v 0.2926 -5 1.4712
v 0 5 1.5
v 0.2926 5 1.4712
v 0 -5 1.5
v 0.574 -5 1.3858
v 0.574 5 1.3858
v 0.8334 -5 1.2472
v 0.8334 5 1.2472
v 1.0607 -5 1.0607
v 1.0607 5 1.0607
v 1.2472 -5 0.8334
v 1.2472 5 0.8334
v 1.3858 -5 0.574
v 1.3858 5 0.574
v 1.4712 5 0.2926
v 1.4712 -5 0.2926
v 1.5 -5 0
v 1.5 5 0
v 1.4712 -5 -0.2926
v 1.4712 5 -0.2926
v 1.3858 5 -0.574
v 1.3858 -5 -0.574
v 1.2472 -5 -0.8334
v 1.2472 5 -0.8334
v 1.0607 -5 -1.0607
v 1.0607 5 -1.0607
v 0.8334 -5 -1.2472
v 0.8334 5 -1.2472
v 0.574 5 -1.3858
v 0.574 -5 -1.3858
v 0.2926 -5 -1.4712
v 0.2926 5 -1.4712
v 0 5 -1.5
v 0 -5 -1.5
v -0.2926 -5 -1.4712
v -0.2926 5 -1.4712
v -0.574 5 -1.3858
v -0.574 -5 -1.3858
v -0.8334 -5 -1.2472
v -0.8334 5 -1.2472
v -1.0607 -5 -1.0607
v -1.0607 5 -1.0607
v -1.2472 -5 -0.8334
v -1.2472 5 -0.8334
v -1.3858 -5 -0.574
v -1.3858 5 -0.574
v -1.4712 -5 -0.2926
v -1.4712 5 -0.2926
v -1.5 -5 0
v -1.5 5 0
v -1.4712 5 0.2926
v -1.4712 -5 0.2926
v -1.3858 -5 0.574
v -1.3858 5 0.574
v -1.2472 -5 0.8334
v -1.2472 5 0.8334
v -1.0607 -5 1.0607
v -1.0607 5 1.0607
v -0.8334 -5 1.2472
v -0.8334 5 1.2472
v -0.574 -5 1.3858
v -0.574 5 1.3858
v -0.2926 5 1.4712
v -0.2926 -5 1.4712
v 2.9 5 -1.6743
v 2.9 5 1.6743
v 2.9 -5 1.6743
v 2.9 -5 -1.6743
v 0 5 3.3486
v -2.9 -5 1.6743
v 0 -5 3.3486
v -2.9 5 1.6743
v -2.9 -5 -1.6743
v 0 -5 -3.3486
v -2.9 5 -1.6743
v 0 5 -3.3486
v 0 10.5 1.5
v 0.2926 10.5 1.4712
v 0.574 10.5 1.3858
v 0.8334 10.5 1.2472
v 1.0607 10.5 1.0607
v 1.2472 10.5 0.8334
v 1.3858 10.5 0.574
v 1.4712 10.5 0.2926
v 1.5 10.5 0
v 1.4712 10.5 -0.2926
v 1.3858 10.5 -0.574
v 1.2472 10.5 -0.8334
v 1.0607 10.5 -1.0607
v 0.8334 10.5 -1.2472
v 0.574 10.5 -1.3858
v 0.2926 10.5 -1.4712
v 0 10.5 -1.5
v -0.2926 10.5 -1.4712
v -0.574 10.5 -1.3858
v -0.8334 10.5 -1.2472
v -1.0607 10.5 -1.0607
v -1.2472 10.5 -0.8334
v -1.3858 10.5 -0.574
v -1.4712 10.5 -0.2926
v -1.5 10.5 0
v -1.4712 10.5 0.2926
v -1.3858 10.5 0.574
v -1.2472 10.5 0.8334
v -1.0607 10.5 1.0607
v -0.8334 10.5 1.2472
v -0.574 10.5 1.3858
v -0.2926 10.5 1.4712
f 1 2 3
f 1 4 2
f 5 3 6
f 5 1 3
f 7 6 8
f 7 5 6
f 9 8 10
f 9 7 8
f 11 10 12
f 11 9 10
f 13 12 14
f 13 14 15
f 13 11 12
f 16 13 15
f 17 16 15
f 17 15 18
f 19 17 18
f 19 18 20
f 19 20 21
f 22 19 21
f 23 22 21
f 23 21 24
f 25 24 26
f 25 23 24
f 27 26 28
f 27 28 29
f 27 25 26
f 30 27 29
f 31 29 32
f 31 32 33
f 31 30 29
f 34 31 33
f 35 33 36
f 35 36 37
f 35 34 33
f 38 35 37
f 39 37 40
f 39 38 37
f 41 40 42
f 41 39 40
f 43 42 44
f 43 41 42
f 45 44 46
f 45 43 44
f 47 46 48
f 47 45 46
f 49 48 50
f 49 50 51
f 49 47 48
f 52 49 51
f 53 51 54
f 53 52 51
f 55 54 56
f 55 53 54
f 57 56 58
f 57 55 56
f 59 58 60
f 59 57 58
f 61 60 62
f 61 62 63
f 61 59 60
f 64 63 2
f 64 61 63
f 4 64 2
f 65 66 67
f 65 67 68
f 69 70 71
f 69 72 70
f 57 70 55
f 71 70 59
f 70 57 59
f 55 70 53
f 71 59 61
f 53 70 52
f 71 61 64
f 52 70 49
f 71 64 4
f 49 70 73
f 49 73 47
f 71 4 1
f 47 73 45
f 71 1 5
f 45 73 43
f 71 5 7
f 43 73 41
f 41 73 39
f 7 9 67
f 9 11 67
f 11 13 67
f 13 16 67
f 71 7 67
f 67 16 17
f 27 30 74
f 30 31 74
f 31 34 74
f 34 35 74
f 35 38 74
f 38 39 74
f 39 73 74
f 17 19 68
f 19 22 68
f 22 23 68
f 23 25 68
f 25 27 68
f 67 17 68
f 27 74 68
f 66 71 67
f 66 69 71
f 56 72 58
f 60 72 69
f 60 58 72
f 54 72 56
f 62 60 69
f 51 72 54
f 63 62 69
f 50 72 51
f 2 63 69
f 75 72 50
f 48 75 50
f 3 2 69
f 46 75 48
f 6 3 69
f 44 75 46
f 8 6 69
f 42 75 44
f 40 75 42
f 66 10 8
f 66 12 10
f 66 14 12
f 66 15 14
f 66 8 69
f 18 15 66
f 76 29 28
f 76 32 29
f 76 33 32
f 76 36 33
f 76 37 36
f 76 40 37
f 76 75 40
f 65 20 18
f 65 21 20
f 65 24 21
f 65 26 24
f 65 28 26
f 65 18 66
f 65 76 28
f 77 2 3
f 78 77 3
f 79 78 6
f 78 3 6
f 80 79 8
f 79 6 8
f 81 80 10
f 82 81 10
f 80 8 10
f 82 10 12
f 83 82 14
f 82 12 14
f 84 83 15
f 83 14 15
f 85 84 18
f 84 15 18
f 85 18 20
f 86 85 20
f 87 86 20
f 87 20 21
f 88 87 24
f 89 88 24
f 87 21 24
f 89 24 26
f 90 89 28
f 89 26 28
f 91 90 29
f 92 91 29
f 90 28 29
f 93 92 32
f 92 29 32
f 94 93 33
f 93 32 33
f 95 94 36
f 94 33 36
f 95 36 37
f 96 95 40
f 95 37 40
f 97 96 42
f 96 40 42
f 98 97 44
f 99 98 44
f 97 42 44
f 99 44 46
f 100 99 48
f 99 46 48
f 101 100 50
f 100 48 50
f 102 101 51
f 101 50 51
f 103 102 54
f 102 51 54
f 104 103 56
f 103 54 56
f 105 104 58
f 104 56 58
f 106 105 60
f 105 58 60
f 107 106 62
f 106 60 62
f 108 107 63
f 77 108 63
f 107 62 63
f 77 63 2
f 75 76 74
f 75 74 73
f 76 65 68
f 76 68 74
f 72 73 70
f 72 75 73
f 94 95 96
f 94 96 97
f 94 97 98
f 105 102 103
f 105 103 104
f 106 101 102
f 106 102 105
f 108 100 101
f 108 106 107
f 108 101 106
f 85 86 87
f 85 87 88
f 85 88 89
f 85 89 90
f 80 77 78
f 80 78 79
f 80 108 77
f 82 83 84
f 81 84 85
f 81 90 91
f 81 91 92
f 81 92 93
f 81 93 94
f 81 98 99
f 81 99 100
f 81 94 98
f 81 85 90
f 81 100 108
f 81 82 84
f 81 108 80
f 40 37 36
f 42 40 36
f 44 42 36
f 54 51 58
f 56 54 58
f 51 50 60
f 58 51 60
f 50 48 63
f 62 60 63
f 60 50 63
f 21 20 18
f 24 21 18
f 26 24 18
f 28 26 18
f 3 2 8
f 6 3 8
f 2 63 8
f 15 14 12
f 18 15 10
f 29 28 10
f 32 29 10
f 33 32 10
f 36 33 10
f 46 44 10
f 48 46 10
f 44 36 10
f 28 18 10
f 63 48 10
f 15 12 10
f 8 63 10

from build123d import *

# Parameters (mm, degrees)
SKETCH1_R           = 1.5
BOSS_EXTRUDE1_DEPTH = 5
SKETCH2_R           = 1.5
BOSS_EXTRUDE2_DEPTH = 5.5


with BuildPart() as part:
    # Sketch1 → Boss-Extrude1 (new, symmetric)
    with BuildSketch(Plane(origin=(0, 0, 0), x_dir=(1, 0, 0), z_dir=(0, 1, 0))):
        Polygon((0, -3.348631561), (2.9, -1.674315781), (2.9, 1.674315781), (0, 3.348631561), (-2.9, 1.674315781), (-2.9, -1.674315781), align=None)
        with Locations(Location((0, 0, 0), (0, 0, 270))):
            Circle(SKETCH1_R, mode=Mode.SUBTRACT)
    extrude(amount=BOSS_EXTRUDE1_DEPTH, both=True)


with BuildPart() as body_2:
    # Sketch2 → Boss-Extrude2 (new body)
    with BuildSketch(Plane(origin=(0, 5, 0), x_dir=(1, 0, 0), z_dir=(0, 1, 0))):
        with Locations(Location((0, 0, 0), (0, 0, 270))):
            Circle(SKETCH2_R)
    extrude(amount=BOSS_EXTRUDE2_DEPTH)


solid = Compound([part.part, body_2.part])
